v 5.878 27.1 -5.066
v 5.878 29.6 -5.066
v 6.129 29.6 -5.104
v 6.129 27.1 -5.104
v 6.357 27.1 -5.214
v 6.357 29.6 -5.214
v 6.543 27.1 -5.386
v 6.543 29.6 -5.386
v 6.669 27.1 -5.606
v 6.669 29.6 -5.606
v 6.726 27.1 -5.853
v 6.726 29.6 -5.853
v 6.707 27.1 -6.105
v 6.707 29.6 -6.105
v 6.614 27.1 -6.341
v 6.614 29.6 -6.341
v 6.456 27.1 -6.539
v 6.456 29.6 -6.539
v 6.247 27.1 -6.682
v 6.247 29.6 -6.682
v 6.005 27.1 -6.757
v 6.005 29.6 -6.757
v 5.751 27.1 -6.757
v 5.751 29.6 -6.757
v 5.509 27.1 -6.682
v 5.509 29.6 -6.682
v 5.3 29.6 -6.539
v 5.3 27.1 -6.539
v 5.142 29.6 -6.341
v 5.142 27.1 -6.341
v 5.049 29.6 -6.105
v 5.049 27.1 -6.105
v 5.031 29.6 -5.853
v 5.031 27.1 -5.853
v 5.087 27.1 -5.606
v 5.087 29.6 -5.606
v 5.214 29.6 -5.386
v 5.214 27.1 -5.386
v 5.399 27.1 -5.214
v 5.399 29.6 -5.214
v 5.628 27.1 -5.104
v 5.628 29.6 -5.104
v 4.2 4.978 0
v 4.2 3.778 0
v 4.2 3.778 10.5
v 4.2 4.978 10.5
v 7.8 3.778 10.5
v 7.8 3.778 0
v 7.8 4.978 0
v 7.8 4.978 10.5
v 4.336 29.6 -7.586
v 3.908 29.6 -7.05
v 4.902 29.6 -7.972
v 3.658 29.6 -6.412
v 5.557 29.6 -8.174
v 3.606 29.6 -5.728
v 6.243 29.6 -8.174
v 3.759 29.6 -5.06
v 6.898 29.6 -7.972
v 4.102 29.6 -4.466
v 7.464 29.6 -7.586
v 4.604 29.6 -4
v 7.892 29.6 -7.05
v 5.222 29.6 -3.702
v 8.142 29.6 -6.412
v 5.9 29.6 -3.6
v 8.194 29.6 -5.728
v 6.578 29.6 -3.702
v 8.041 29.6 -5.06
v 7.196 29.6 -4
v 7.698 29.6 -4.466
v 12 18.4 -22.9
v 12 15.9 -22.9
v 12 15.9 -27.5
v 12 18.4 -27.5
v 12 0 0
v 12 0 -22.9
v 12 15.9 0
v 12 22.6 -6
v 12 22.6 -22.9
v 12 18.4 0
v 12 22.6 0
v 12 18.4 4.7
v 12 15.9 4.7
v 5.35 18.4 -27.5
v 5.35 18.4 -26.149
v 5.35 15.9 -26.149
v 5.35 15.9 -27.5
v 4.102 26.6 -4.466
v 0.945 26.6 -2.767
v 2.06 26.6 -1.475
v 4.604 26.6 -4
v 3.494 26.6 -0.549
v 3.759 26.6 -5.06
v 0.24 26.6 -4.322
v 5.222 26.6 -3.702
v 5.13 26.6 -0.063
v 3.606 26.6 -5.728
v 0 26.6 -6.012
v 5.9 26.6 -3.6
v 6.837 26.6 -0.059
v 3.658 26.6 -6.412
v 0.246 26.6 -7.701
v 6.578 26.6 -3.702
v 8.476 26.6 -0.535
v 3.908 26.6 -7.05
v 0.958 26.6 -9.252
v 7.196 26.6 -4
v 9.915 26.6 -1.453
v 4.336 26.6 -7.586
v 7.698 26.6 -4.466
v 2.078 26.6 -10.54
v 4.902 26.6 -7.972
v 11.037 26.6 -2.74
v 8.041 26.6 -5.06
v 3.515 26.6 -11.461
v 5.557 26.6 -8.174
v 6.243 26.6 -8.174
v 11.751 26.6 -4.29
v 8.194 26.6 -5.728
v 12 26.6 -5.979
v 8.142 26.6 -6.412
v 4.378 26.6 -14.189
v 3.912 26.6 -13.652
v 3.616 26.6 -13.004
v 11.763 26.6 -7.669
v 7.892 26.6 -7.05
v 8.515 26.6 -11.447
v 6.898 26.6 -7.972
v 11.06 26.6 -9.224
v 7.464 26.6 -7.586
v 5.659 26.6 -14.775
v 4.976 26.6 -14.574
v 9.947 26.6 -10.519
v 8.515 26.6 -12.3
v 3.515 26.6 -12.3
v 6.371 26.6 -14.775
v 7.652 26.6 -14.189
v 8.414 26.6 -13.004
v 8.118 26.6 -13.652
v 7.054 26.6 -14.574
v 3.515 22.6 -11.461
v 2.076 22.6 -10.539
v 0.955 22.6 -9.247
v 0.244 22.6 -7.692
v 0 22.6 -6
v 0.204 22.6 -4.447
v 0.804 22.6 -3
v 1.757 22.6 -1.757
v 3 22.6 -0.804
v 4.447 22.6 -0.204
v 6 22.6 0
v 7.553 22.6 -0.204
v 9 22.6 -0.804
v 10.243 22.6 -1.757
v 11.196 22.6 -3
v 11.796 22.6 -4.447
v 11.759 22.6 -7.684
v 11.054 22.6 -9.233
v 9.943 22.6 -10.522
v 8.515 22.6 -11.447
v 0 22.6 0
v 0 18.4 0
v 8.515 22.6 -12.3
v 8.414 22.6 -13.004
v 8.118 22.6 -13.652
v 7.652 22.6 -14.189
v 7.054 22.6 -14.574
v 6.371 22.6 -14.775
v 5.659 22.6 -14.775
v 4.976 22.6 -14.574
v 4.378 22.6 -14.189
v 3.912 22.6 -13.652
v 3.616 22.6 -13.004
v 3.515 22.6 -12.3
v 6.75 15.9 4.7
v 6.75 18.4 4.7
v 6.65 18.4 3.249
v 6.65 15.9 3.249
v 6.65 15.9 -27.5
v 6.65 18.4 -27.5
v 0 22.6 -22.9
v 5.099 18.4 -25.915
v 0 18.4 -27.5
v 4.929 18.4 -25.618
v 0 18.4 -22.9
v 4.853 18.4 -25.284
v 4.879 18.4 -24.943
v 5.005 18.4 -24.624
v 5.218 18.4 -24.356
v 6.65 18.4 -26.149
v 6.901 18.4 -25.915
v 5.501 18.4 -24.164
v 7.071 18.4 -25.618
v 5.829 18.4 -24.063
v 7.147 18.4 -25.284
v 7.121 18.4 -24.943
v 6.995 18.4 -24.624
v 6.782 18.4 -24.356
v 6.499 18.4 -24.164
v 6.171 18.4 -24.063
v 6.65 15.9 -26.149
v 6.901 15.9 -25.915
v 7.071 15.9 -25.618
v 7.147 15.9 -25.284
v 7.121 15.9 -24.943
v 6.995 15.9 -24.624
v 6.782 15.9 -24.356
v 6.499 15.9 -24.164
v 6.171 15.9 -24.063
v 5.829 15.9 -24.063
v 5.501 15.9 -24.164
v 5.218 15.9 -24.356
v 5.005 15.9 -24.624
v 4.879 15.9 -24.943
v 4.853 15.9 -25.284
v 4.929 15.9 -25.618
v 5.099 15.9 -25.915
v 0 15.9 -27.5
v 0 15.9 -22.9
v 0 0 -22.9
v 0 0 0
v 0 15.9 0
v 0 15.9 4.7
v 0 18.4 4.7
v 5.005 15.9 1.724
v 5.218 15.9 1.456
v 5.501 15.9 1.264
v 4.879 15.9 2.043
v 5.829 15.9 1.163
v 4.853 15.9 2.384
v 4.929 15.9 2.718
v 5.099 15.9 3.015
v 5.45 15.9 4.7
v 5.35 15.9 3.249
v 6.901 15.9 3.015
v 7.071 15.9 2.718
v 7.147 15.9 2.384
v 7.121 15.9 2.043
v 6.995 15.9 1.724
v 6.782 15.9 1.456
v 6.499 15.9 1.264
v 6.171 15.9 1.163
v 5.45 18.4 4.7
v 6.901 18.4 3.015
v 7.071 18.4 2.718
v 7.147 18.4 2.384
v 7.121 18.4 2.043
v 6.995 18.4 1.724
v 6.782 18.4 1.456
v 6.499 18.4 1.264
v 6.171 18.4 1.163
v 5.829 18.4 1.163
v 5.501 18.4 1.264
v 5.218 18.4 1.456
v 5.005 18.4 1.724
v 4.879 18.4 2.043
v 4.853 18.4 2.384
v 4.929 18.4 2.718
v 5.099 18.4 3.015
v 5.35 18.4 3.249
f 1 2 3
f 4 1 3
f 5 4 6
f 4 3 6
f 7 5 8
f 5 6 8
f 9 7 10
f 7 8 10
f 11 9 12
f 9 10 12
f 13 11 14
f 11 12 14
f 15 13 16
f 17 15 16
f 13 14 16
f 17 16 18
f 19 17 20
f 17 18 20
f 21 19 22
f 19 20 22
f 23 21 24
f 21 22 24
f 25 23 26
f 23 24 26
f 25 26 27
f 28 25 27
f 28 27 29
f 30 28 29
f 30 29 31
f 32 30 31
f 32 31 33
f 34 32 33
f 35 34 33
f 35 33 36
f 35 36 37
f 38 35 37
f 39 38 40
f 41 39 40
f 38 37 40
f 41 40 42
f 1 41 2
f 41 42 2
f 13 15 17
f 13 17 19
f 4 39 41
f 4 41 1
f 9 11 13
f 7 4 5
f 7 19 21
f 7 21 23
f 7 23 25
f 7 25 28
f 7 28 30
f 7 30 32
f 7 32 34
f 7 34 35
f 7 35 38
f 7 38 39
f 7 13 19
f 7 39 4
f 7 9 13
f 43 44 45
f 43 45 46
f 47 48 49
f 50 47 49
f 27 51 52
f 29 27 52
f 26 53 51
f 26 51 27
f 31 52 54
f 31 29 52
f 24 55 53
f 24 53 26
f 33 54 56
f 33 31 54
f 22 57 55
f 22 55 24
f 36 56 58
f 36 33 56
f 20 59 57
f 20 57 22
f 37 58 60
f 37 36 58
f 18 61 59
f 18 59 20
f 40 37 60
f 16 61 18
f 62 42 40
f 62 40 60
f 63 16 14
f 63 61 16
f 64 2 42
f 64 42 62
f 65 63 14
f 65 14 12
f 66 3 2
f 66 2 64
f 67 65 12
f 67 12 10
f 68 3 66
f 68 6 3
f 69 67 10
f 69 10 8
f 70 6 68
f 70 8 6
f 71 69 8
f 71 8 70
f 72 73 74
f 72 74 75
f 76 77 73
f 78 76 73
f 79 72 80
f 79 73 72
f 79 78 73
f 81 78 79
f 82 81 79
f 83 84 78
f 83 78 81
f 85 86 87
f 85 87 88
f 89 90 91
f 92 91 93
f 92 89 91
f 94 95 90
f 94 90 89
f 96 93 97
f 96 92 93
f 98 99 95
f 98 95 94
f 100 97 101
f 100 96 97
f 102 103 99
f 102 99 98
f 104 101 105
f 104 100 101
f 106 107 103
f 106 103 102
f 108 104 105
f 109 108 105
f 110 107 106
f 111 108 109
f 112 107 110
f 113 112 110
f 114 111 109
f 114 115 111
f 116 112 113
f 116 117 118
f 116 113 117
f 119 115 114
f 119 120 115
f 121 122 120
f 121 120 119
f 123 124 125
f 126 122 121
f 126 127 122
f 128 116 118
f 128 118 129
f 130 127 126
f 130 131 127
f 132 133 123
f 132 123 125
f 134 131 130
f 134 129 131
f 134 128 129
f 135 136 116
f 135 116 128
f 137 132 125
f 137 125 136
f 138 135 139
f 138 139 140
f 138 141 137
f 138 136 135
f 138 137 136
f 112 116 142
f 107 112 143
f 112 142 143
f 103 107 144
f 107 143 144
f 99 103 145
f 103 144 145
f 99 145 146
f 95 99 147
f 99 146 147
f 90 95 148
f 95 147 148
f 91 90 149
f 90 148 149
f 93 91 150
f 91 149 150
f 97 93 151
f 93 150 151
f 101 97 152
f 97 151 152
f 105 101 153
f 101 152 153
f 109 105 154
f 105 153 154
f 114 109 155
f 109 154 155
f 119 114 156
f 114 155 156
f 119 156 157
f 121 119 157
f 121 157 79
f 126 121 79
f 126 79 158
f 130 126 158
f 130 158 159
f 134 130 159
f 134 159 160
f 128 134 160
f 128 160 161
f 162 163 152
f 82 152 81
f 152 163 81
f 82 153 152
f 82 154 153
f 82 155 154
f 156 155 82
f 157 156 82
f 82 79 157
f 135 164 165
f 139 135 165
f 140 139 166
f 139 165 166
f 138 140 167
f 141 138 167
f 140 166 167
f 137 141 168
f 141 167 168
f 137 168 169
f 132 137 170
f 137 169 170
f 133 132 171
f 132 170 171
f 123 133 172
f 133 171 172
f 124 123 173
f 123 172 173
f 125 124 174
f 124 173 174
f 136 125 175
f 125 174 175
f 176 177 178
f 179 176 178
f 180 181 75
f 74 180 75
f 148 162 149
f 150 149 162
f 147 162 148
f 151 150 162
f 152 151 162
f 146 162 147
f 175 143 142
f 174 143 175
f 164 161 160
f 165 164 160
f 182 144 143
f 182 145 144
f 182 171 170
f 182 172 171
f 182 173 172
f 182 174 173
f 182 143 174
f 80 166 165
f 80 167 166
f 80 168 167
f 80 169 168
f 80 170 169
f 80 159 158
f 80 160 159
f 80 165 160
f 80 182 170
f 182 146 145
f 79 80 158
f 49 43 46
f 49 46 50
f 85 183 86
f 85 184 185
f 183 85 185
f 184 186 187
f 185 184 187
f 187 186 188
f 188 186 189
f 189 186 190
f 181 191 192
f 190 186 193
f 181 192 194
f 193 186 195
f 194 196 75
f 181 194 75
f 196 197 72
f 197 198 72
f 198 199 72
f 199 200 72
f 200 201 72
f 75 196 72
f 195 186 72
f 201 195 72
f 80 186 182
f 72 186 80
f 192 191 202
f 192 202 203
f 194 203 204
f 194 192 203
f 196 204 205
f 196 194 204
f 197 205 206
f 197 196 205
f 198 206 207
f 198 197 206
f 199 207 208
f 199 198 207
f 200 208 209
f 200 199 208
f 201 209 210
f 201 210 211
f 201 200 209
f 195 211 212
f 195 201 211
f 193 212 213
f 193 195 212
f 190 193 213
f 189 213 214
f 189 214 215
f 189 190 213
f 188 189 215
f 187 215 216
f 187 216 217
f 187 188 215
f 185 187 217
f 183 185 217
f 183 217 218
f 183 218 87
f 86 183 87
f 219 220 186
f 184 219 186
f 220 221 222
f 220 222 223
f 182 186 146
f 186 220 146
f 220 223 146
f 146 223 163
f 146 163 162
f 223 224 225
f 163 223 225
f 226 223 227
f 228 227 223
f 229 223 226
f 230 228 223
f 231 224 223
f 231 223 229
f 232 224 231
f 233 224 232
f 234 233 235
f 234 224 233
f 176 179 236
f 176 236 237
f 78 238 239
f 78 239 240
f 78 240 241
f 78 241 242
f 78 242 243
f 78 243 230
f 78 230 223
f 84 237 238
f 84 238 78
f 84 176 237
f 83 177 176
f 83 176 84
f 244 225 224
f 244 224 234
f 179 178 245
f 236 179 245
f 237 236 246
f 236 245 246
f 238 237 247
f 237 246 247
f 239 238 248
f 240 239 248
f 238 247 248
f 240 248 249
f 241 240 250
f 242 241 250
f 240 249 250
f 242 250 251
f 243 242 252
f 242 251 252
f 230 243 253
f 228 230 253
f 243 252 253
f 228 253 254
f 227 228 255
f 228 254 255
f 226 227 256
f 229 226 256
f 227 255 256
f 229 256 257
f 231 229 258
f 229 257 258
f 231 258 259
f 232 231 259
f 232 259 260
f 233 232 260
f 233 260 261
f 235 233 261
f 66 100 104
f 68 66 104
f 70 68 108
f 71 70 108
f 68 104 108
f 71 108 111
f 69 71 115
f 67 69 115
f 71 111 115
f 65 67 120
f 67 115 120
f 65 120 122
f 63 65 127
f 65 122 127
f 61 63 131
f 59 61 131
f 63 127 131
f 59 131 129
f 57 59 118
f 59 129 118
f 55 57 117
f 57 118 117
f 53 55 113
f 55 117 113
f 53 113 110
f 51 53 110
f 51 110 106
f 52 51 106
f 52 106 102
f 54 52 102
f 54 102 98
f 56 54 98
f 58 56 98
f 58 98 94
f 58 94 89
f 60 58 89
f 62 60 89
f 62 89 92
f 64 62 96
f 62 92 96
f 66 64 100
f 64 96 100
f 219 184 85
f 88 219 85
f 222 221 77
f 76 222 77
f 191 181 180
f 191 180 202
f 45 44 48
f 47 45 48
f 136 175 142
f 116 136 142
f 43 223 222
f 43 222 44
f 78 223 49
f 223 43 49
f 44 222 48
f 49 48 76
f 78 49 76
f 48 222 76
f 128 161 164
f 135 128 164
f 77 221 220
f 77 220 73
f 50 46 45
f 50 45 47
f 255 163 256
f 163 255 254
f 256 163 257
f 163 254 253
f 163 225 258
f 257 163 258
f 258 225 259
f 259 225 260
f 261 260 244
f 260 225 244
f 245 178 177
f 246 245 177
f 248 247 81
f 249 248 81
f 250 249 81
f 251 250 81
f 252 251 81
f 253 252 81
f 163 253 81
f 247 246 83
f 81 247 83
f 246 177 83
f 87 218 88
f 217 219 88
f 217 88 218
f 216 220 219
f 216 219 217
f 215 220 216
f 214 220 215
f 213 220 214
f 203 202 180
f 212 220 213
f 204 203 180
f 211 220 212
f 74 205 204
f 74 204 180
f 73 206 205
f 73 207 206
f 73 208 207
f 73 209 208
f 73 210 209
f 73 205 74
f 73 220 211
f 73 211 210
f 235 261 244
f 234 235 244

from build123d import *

# Parameters (mm, degrees)
SKETCH2_W           = 12
SKETCH2_H           = 22.9
BOSS_EXTRUDE1_DEPTH = 22.6
SKETCH3_W           = 12
SKETCH3_H           = 2.5
BOSS_EXTRUDE2_DEPTH = 32.2
BOSS_EXTRUDE3_DEPTH = 4
SKETCH7_R           = 2.3
BOSS_EXTRUDE4_DEPTH = 3
CUT_EXTRUDE1_DEPTH  = 2.5
SKETCH10_R          = 0.85
CUT_EXTRUDE2_DEPTH  = 2.5
SKETCH12_W          = 3.6
SKETCH12_H          = 1.2
BOSS_EXTRUDE5_DEPTH = 10.5


with BuildPart() as part:
    # Sketch2 → Boss-Extrude1 (new body)
    with BuildSketch(Plane(origin=(0, 0, 0), x_dir=(1, 0, 0), z_dir=(0, 1, 0))):
        with Locations((6, 11.45)):
            Rectangle(SKETCH2_W, SKETCH2_H)
    extrude(amount=BOSS_EXTRUDE1_DEPTH)

    # Sketch3 → Boss-Extrude2 (add)
    with BuildSketch(Plane.XY.offset(4.7)):
        with Locations((6, 17.15)):
            Rectangle(SKETCH3_W, SKETCH3_H)
    extrude(amount=-BOSS_EXTRUDE2_DEPTH)

    # Sketch5 → Boss-Extrude3 (add)
    with BuildSketch(Plane(origin=(0, 22.6, 0), x_dir=(1, 0, 0), z_dir=(0, 1, 0))):
        with BuildLine():
            Line((3.515017185, 12.299982102), (3.515017185, 11.461214188))
            ThreePointArc((3.515017185, 11.461214188), (5.98348051, 2.2741e-05), (8.515017185, 11.447447894))
            Line((8.515017185, 11.447447894), (8.515017185, 12.299982102))
            ThreePointArc((8.515017185, 12.299982102), (6.015017185, 14.799982102), (3.515017185, 12.299982102))
        make_face()
    extrude(amount=BOSS_EXTRUDE3_DEPTH)

    # Sketch7 → Boss-Extrude4 (add)
    with BuildSketch(Plane(origin=(0, 26.6, 0), x_dir=(1, 0, 0), z_dir=(0, 1, 0))):
        with Locations(Location((5.9, 5.9, 0), (0, 0, 270))):
            Circle(SKETCH7_R)
    extrude(amount=BOSS_EXTRUDE4_DEPTH)

    # Sketch9 → Cut-Extrude1 (cut)
    with BuildSketch(Plane(origin=(0, 18.4, 0), x_dir=(1, 0, 0), z_dir=(0, 1, 0))):
        with BuildLine():
            Line((5.35, 27.5), (6.65, 27.5))
            Line((6.65, 27.5), (6.65, 26.148683298))
            ThreePointArc((6.65, 26.148683298), (6, 24.05), (5.35, 26.148683298))
            Line((5.35, 26.148683298), (5.35, 27.5))
        make_face()
        with BuildLine():
            Line((6.75, -4.7), (6.65, -3.248683298))
            ThreePointArc((6.65, -3.248683298), (6, -1.15), (5.35, -3.248683298))
            Line((5.35, -3.248683298), (5.45, -4.7))
            Line((5.45, -4.7), (6.75, -4.7))
        make_face()
    extrude(amount=-CUT_EXTRUDE1_DEPTH, mode=Mode.SUBTRACT)

    # Sketch10 → Cut-Extrude2 (cut)
    with BuildSketch(Plane(origin=(0, 29.6, 0), x_dir=(1, 0, 0), z_dir=(0, 1, 0))):
        with Locations(Location((5.87814142, 5.916228473, 0), (0, 0, 270))):
            Circle(SKETCH10_R)
    extrude(amount=-CUT_EXTRUDE2_DEPTH, mode=Mode.SUBTRACT)

    # Sketch12 → Boss-Extrude5 (add)
    with BuildSketch(Plane.XY):
        with Locations((6, 4.377974725)):
            Rectangle(SKETCH12_W, SKETCH12_H)
    extrude(amount=BOSS_EXTRUDE5_DEPTH)


solid = part.part
